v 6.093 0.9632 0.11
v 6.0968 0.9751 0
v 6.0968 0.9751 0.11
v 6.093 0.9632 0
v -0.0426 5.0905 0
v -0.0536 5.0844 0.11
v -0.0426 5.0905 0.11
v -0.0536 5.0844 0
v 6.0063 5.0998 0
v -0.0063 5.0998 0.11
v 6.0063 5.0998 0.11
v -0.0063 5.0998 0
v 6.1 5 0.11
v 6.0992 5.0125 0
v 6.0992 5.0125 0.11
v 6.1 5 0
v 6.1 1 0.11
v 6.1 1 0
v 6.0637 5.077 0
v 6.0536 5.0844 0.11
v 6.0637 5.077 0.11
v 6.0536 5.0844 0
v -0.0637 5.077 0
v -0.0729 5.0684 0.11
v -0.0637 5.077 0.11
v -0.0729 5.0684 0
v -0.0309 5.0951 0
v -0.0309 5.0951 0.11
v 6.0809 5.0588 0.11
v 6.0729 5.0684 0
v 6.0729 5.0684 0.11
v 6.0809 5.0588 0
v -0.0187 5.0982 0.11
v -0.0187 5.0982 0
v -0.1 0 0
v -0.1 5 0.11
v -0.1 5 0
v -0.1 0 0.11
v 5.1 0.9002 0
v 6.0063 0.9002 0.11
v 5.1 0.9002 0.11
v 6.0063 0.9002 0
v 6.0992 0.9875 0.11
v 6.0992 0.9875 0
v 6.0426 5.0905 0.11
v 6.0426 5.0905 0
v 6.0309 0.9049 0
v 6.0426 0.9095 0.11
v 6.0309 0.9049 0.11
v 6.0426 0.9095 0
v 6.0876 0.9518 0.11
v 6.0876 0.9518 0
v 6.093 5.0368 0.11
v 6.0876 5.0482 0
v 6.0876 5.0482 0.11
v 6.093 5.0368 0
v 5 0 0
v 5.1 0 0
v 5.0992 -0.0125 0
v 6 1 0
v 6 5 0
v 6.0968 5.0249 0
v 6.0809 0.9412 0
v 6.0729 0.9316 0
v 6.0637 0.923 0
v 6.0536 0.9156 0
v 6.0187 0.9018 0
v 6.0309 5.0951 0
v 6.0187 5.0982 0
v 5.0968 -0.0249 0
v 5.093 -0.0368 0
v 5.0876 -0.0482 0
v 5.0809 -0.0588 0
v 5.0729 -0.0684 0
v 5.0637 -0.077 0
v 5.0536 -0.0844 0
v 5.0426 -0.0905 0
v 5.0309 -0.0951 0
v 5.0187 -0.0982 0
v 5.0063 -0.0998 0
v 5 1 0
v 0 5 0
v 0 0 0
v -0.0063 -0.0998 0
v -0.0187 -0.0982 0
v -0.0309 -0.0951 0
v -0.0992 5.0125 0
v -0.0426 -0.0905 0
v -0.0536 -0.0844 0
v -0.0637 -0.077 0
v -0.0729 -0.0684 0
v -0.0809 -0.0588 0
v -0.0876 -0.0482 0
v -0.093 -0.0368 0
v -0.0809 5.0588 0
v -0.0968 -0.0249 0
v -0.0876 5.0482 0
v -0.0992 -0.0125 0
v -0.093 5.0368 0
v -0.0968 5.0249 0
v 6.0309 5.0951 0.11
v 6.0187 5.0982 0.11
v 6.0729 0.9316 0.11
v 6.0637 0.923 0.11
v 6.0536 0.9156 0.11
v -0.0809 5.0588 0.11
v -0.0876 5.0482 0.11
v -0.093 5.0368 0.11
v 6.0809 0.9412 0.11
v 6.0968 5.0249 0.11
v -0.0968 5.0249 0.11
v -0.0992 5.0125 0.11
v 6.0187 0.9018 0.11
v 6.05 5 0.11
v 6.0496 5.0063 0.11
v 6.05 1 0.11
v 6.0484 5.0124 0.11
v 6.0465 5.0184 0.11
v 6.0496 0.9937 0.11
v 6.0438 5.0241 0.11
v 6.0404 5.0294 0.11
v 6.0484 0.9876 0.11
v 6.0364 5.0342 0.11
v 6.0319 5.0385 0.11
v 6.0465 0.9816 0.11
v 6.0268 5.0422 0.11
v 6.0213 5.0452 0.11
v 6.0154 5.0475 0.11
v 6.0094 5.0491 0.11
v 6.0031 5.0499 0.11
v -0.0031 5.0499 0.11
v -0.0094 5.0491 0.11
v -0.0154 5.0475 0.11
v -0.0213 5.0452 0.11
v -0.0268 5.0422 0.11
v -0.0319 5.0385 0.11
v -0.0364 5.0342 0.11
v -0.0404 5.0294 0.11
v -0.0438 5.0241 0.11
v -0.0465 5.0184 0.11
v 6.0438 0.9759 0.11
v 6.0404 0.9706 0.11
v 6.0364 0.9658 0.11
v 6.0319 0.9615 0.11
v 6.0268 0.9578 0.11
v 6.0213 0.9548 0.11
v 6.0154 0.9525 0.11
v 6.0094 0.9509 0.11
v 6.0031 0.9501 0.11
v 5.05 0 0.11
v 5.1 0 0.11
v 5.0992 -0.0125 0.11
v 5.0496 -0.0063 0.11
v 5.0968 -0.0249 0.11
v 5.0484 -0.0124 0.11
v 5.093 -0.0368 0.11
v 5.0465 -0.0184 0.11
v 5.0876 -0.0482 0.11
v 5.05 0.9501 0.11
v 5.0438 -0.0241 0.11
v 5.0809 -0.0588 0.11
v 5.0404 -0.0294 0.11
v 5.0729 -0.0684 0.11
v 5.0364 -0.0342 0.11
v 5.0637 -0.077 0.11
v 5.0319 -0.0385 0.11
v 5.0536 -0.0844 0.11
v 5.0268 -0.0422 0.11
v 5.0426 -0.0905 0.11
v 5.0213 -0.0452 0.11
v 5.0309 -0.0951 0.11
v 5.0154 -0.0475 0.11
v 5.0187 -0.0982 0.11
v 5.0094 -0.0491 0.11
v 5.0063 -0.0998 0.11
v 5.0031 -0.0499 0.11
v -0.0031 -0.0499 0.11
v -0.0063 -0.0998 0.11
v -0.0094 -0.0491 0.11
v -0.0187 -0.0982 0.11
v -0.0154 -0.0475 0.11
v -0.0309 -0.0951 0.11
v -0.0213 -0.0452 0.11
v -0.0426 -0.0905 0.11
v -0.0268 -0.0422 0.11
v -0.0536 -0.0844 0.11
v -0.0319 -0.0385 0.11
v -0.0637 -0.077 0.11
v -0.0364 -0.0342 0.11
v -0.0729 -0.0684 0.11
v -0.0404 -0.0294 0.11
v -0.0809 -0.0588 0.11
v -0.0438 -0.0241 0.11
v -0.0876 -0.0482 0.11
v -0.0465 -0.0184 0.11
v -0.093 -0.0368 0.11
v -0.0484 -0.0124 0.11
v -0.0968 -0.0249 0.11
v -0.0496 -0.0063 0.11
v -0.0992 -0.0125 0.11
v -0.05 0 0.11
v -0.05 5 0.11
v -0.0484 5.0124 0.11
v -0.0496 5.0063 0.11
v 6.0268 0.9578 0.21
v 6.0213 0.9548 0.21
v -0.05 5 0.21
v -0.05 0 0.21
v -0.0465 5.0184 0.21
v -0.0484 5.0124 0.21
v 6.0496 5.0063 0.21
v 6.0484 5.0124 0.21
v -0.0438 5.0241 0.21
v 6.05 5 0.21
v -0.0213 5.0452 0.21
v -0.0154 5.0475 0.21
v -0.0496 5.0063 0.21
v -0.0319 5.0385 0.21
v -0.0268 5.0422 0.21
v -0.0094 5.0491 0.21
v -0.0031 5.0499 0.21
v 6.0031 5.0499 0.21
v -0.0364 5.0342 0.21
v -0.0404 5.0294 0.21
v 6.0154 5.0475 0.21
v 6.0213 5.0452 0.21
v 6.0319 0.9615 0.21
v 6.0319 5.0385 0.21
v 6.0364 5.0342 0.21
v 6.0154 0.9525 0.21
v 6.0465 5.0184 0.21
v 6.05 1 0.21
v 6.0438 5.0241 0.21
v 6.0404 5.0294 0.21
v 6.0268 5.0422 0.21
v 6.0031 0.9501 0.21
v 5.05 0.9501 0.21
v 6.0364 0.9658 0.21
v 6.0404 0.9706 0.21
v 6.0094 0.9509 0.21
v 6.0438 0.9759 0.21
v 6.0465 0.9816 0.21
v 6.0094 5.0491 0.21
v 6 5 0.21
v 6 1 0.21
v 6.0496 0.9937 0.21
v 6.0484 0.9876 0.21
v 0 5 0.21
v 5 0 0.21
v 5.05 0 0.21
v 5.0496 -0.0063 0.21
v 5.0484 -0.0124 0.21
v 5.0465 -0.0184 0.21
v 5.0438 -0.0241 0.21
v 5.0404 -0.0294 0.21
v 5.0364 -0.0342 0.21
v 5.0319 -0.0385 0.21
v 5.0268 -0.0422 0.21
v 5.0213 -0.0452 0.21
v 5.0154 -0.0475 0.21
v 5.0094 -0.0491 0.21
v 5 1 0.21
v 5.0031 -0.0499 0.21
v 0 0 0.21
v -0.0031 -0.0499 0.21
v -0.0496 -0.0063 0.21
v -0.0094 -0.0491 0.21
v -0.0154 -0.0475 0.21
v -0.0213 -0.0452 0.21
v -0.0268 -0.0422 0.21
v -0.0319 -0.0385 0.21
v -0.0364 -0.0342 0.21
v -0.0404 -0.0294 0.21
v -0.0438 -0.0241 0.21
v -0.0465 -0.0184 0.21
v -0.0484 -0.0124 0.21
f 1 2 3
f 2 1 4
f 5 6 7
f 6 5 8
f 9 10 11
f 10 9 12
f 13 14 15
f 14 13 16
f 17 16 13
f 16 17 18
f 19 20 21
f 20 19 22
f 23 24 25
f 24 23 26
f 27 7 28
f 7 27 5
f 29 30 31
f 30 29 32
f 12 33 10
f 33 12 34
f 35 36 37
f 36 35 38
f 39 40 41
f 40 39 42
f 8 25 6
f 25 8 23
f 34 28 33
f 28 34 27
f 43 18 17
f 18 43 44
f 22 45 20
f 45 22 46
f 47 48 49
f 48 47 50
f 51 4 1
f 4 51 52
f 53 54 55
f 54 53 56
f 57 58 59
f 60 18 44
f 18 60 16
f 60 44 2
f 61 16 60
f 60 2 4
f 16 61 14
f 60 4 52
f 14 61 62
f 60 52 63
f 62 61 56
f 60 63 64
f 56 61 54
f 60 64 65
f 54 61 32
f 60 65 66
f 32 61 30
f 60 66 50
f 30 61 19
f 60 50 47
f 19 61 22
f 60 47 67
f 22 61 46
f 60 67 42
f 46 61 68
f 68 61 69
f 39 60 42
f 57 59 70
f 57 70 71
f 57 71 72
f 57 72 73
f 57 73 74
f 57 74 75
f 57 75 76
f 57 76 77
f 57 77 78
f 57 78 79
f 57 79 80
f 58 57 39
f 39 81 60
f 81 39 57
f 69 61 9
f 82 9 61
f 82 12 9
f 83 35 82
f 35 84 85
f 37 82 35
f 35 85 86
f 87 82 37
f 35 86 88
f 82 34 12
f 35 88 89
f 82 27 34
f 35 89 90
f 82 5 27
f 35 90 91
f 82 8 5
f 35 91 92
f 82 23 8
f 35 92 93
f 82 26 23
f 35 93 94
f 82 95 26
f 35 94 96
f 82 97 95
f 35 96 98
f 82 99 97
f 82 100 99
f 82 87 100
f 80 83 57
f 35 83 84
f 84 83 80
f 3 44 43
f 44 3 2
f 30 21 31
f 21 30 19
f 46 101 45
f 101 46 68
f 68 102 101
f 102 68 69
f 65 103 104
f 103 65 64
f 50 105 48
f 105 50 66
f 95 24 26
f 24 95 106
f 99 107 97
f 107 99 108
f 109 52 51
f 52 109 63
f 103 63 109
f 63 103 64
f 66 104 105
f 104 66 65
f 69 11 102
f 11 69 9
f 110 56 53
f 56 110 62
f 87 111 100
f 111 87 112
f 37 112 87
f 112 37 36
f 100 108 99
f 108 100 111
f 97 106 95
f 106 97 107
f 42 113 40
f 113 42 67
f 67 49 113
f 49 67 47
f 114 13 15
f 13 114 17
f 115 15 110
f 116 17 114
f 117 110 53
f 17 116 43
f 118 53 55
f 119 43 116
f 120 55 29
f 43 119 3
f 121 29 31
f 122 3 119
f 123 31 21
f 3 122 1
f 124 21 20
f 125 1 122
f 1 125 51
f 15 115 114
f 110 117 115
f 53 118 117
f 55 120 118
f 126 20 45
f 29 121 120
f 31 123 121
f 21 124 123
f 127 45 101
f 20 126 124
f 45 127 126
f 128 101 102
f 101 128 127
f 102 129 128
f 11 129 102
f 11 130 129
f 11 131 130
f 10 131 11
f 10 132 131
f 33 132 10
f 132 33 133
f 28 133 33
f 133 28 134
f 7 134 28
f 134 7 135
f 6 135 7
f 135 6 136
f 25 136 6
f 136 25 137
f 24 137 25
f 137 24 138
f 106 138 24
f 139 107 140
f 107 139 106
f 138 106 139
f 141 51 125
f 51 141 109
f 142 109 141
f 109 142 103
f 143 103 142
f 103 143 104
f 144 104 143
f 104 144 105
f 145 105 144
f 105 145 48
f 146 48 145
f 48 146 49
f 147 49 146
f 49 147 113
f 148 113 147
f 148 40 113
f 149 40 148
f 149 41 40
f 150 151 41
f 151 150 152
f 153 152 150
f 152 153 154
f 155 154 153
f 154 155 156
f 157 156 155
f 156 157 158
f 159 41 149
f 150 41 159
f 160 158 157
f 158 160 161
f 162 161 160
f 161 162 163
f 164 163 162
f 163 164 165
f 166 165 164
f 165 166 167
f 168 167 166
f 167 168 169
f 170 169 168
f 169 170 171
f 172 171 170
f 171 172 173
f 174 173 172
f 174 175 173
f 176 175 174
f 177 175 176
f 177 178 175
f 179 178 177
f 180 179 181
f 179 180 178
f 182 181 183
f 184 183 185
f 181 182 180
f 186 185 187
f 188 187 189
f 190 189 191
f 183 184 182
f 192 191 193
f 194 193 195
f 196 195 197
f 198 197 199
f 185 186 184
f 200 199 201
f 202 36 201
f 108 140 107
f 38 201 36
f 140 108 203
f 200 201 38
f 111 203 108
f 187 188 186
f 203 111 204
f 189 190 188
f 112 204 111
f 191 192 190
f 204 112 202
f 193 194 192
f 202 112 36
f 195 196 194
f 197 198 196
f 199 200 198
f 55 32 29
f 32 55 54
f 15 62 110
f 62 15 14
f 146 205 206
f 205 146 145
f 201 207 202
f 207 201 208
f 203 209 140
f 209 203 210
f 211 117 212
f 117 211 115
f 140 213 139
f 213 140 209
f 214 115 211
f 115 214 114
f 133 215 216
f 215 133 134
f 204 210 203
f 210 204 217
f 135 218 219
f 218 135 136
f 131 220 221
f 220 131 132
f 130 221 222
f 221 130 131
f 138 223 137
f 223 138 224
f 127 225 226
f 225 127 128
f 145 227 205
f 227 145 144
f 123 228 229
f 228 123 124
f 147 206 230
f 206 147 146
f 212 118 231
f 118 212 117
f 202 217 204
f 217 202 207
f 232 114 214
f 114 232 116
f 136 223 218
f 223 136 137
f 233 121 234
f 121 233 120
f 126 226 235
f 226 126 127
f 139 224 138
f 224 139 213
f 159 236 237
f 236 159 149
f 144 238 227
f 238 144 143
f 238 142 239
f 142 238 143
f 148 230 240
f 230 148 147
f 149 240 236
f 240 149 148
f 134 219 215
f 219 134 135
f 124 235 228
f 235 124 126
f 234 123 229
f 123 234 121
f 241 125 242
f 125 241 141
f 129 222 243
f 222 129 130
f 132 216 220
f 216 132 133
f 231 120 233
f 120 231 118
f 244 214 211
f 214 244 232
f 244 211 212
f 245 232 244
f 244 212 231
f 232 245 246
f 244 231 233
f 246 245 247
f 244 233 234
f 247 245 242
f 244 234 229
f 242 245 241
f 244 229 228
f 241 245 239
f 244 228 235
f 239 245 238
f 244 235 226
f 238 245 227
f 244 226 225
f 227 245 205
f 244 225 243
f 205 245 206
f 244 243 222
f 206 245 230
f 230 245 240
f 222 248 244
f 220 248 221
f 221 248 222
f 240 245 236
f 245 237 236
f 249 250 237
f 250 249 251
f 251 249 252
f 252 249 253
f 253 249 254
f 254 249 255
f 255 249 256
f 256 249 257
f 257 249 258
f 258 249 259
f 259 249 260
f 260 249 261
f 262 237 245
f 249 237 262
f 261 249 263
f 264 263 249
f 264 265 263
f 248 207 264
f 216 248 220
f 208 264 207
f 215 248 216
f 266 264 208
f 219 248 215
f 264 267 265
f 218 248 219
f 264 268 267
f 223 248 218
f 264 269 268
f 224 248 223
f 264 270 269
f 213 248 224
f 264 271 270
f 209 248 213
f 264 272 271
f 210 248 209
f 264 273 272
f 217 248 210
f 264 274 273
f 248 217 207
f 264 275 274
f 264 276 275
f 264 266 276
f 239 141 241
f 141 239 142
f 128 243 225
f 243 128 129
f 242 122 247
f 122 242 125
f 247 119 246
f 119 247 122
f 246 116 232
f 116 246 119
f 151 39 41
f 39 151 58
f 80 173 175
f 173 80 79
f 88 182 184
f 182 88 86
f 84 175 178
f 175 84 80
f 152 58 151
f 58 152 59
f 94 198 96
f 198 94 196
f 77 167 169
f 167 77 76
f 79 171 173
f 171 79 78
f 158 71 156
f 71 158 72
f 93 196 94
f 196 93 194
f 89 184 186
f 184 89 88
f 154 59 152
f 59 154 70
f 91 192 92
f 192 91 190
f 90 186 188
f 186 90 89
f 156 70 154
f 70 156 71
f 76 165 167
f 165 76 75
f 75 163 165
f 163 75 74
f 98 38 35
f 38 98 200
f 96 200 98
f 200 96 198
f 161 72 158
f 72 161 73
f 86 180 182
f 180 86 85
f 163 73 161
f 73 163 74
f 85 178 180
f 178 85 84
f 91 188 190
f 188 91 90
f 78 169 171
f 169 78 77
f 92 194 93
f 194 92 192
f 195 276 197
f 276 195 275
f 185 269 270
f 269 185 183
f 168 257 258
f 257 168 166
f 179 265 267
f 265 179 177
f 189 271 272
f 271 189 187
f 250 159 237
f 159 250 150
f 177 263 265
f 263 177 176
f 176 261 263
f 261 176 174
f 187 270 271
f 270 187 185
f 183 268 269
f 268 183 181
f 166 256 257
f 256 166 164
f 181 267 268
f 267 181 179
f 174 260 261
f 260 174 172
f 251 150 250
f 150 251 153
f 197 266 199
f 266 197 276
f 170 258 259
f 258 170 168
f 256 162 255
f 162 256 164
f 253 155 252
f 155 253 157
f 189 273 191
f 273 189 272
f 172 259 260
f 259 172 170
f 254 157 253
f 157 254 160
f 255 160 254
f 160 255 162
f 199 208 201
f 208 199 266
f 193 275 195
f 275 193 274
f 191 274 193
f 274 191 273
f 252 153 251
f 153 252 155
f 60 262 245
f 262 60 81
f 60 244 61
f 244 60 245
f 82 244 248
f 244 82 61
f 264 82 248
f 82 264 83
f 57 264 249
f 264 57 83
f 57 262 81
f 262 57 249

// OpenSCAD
module sword() {
  linear_extrude(height = 0.01)
  polygon([[0,0], [5,0], [5,1], [6,1], [6,5], [0,5]]);
}

$fn = 50;
$fa = 1;

module around() {
  rotate_extrude(angle=360)
  polygon([[0,0], [0, 0.2], [0.05, 0.2], [0.05, 0.1], [0.1, 0.1], [0.1, 0]]);
}

difference() {
  // offset outwards. We wrap minkowski() with render() to save the results of minkowski()
 // render() { 
    minkowski() {
      sword();
      around();
    }
  //}/**/
  // The original shape
  // we extend the original shape in the z-direction to get rid of the shimmering of 
  // co-incident planes
  translate([0, 0, -0.1])
  scale([1, 1, 100])
  sword();
}
